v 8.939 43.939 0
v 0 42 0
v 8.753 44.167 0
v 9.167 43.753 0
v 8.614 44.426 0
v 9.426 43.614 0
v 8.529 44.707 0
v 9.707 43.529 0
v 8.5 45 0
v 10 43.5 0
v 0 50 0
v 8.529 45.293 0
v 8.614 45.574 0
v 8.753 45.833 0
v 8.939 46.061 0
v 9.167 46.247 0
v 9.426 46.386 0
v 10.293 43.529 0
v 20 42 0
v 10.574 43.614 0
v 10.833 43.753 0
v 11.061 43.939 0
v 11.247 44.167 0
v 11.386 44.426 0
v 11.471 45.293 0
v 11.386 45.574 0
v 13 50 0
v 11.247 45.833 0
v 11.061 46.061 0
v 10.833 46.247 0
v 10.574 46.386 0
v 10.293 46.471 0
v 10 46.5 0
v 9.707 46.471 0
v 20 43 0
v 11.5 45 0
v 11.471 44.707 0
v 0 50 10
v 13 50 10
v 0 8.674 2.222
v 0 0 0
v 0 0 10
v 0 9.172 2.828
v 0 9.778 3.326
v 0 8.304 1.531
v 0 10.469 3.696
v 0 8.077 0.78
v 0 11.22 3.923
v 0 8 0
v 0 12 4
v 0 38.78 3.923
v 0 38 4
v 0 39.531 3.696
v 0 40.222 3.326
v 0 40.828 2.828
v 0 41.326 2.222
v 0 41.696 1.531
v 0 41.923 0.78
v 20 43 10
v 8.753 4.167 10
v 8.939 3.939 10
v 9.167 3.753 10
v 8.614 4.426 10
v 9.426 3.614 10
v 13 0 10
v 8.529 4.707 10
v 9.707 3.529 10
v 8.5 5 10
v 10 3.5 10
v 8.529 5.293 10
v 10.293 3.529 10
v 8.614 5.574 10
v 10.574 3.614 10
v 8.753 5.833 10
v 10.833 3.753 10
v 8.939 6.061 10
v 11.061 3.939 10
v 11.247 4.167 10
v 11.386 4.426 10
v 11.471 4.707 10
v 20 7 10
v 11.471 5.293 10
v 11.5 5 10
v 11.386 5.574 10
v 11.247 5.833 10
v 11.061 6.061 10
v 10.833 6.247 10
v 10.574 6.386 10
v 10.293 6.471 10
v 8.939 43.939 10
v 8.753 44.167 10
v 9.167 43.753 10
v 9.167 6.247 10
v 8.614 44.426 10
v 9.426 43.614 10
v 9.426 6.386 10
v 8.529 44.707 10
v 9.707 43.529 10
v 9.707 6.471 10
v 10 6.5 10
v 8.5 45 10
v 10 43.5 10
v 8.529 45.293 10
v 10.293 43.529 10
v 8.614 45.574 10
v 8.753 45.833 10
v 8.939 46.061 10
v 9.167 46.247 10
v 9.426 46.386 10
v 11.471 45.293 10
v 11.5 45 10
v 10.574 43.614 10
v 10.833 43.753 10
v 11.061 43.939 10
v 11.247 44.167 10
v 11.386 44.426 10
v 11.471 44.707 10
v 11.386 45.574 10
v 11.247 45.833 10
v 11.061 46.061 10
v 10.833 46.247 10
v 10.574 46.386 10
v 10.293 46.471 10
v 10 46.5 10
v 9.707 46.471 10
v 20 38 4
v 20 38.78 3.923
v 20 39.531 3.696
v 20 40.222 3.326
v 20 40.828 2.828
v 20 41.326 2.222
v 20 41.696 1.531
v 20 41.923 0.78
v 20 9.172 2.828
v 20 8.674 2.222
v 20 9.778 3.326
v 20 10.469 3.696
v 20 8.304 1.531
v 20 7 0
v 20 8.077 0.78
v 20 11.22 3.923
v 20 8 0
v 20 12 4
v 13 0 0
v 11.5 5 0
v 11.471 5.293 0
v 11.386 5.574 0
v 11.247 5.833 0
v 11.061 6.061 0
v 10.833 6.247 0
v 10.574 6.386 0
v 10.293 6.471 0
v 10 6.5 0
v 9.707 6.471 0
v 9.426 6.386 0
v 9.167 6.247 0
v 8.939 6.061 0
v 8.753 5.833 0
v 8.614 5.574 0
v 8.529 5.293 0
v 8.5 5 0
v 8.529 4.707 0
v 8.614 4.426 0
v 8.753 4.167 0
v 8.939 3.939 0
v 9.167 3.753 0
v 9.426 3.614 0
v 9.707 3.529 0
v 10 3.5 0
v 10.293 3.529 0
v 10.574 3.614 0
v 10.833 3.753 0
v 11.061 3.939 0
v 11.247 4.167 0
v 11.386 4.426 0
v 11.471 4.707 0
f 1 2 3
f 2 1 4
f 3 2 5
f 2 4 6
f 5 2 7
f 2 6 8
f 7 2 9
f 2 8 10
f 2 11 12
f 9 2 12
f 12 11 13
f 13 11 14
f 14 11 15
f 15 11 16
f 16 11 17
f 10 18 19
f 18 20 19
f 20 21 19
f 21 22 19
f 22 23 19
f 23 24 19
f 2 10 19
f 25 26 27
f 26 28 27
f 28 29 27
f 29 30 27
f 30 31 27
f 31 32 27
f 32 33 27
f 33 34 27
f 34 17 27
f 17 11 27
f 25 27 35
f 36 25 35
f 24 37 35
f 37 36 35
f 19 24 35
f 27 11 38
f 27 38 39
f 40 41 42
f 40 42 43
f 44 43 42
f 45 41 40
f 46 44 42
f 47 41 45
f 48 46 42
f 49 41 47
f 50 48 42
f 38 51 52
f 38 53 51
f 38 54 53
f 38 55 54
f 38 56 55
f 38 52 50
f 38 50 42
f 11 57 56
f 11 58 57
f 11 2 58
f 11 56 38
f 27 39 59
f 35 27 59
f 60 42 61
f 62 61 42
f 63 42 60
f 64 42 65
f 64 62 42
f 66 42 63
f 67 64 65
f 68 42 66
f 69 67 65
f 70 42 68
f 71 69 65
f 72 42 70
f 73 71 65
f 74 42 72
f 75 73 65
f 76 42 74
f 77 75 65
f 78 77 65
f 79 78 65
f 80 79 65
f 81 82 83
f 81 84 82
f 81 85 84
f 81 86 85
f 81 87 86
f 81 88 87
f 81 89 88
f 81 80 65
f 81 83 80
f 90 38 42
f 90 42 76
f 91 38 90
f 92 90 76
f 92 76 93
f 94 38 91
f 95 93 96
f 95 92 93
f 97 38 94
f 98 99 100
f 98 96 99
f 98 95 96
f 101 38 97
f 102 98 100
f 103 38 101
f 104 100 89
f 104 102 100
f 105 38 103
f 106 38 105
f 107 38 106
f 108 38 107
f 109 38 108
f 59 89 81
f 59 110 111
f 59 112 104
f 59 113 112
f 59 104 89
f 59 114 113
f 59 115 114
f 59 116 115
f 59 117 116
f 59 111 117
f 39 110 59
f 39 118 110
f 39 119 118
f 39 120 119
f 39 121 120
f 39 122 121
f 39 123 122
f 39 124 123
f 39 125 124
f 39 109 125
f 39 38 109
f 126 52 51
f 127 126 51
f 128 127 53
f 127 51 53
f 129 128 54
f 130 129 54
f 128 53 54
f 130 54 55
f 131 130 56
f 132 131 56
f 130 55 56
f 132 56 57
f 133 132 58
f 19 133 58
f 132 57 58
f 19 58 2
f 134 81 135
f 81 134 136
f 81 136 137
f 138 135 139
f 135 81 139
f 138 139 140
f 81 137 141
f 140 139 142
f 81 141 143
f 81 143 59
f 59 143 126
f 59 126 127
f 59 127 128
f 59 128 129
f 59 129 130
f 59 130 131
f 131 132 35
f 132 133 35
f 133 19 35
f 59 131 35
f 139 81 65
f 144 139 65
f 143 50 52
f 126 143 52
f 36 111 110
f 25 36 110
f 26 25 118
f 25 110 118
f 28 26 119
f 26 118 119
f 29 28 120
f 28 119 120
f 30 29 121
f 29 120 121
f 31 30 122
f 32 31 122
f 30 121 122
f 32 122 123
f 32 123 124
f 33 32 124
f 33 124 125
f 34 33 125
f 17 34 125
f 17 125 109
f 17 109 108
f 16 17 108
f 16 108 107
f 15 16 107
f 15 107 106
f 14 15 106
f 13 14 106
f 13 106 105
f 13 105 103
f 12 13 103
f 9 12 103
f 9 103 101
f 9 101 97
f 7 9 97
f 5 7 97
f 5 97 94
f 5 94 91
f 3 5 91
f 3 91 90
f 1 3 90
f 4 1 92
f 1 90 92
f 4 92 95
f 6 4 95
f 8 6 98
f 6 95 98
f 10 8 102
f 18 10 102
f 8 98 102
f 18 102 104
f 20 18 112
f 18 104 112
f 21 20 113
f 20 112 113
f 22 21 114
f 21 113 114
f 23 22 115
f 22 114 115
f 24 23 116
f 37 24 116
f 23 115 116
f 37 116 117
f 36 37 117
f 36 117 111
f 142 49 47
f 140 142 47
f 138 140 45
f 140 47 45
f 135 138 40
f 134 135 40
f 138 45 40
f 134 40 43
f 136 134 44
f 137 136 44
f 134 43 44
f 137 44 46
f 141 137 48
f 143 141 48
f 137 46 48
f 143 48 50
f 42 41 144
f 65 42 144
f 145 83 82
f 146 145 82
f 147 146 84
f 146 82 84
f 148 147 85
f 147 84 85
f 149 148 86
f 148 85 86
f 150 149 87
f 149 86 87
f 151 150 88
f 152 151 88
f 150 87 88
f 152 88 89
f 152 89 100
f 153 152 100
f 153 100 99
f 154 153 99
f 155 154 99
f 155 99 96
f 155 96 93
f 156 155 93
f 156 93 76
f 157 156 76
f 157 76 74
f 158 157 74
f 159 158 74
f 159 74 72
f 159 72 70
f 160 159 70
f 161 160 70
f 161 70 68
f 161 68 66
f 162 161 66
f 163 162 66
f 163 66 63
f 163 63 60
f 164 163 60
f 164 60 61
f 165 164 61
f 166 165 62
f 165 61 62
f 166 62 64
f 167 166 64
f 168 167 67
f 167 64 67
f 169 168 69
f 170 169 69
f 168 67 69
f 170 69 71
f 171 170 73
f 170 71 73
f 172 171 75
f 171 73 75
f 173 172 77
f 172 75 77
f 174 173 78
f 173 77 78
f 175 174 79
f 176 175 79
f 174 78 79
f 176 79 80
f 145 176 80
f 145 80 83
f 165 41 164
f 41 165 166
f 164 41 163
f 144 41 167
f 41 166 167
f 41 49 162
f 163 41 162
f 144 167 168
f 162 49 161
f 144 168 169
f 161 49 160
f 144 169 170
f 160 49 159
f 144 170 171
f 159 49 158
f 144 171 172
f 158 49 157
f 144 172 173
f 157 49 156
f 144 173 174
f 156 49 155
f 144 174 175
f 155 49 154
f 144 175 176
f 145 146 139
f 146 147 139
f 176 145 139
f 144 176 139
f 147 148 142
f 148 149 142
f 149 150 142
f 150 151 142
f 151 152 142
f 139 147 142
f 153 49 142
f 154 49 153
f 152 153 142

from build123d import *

# Parameters (mm, degrees)
F0_W     = 20
F0_H     = 50
F1_DEPTH = 10
F2_R     = 1.5
F3_DEPTH = 10.001
F5_DEPTH = 20.001
F7_DEPTH = 10.001


with BuildPart() as f1:
    # F0 (on Top) → F1 (new body)
    with BuildSketch(Plane.XY):
        with Locations((10, 25)):
            Rectangle(F0_W, F0_H)
    extrude(amount=F1_DEPTH)

    # F2 (on face) → F3 (cut, through all)
    with BuildSketch(Plane.XY.offset(10)):
        with Locations((10, 45)):
            Circle(F2_R)
        with Locations((10, 5)):
            Circle(F2_R)
    extrude(amount=-F3_DEPTH, mode=Mode.SUBTRACT)

    # F4 (on face) → F5 (cut, through all)
    with BuildSketch(Plane(origin=(0, 0, 0), x_dir=(0, -1, 0), z_dir=(-1, 0, 0))):
        with BuildLine():
            Line((-42, 0), (-8, 0))
            ThreePointArc((-8, 0), (-9.171573, 2.828427), (-12, 4))
            Line((-12, 4), (-38, 4))
            ThreePointArc((-38, 4), (-40.828427, 2.828427), (-42, 0))
        make_face()
    extrude(amount=-F5_DEPTH, mode=Mode.SUBTRACT)

    # F6 (on face) → F7 (cut, through all)
    with BuildSketch(Plane.XY.offset(10)):
        Polygon((13, 0), (20, 0), (20, 7), align=None)
        Polygon((13, 50), (20, 43), (20, 50), align=None)
    extrude(amount=-F7_DEPTH, mode=Mode.SUBTRACT)


solid = f1.part
